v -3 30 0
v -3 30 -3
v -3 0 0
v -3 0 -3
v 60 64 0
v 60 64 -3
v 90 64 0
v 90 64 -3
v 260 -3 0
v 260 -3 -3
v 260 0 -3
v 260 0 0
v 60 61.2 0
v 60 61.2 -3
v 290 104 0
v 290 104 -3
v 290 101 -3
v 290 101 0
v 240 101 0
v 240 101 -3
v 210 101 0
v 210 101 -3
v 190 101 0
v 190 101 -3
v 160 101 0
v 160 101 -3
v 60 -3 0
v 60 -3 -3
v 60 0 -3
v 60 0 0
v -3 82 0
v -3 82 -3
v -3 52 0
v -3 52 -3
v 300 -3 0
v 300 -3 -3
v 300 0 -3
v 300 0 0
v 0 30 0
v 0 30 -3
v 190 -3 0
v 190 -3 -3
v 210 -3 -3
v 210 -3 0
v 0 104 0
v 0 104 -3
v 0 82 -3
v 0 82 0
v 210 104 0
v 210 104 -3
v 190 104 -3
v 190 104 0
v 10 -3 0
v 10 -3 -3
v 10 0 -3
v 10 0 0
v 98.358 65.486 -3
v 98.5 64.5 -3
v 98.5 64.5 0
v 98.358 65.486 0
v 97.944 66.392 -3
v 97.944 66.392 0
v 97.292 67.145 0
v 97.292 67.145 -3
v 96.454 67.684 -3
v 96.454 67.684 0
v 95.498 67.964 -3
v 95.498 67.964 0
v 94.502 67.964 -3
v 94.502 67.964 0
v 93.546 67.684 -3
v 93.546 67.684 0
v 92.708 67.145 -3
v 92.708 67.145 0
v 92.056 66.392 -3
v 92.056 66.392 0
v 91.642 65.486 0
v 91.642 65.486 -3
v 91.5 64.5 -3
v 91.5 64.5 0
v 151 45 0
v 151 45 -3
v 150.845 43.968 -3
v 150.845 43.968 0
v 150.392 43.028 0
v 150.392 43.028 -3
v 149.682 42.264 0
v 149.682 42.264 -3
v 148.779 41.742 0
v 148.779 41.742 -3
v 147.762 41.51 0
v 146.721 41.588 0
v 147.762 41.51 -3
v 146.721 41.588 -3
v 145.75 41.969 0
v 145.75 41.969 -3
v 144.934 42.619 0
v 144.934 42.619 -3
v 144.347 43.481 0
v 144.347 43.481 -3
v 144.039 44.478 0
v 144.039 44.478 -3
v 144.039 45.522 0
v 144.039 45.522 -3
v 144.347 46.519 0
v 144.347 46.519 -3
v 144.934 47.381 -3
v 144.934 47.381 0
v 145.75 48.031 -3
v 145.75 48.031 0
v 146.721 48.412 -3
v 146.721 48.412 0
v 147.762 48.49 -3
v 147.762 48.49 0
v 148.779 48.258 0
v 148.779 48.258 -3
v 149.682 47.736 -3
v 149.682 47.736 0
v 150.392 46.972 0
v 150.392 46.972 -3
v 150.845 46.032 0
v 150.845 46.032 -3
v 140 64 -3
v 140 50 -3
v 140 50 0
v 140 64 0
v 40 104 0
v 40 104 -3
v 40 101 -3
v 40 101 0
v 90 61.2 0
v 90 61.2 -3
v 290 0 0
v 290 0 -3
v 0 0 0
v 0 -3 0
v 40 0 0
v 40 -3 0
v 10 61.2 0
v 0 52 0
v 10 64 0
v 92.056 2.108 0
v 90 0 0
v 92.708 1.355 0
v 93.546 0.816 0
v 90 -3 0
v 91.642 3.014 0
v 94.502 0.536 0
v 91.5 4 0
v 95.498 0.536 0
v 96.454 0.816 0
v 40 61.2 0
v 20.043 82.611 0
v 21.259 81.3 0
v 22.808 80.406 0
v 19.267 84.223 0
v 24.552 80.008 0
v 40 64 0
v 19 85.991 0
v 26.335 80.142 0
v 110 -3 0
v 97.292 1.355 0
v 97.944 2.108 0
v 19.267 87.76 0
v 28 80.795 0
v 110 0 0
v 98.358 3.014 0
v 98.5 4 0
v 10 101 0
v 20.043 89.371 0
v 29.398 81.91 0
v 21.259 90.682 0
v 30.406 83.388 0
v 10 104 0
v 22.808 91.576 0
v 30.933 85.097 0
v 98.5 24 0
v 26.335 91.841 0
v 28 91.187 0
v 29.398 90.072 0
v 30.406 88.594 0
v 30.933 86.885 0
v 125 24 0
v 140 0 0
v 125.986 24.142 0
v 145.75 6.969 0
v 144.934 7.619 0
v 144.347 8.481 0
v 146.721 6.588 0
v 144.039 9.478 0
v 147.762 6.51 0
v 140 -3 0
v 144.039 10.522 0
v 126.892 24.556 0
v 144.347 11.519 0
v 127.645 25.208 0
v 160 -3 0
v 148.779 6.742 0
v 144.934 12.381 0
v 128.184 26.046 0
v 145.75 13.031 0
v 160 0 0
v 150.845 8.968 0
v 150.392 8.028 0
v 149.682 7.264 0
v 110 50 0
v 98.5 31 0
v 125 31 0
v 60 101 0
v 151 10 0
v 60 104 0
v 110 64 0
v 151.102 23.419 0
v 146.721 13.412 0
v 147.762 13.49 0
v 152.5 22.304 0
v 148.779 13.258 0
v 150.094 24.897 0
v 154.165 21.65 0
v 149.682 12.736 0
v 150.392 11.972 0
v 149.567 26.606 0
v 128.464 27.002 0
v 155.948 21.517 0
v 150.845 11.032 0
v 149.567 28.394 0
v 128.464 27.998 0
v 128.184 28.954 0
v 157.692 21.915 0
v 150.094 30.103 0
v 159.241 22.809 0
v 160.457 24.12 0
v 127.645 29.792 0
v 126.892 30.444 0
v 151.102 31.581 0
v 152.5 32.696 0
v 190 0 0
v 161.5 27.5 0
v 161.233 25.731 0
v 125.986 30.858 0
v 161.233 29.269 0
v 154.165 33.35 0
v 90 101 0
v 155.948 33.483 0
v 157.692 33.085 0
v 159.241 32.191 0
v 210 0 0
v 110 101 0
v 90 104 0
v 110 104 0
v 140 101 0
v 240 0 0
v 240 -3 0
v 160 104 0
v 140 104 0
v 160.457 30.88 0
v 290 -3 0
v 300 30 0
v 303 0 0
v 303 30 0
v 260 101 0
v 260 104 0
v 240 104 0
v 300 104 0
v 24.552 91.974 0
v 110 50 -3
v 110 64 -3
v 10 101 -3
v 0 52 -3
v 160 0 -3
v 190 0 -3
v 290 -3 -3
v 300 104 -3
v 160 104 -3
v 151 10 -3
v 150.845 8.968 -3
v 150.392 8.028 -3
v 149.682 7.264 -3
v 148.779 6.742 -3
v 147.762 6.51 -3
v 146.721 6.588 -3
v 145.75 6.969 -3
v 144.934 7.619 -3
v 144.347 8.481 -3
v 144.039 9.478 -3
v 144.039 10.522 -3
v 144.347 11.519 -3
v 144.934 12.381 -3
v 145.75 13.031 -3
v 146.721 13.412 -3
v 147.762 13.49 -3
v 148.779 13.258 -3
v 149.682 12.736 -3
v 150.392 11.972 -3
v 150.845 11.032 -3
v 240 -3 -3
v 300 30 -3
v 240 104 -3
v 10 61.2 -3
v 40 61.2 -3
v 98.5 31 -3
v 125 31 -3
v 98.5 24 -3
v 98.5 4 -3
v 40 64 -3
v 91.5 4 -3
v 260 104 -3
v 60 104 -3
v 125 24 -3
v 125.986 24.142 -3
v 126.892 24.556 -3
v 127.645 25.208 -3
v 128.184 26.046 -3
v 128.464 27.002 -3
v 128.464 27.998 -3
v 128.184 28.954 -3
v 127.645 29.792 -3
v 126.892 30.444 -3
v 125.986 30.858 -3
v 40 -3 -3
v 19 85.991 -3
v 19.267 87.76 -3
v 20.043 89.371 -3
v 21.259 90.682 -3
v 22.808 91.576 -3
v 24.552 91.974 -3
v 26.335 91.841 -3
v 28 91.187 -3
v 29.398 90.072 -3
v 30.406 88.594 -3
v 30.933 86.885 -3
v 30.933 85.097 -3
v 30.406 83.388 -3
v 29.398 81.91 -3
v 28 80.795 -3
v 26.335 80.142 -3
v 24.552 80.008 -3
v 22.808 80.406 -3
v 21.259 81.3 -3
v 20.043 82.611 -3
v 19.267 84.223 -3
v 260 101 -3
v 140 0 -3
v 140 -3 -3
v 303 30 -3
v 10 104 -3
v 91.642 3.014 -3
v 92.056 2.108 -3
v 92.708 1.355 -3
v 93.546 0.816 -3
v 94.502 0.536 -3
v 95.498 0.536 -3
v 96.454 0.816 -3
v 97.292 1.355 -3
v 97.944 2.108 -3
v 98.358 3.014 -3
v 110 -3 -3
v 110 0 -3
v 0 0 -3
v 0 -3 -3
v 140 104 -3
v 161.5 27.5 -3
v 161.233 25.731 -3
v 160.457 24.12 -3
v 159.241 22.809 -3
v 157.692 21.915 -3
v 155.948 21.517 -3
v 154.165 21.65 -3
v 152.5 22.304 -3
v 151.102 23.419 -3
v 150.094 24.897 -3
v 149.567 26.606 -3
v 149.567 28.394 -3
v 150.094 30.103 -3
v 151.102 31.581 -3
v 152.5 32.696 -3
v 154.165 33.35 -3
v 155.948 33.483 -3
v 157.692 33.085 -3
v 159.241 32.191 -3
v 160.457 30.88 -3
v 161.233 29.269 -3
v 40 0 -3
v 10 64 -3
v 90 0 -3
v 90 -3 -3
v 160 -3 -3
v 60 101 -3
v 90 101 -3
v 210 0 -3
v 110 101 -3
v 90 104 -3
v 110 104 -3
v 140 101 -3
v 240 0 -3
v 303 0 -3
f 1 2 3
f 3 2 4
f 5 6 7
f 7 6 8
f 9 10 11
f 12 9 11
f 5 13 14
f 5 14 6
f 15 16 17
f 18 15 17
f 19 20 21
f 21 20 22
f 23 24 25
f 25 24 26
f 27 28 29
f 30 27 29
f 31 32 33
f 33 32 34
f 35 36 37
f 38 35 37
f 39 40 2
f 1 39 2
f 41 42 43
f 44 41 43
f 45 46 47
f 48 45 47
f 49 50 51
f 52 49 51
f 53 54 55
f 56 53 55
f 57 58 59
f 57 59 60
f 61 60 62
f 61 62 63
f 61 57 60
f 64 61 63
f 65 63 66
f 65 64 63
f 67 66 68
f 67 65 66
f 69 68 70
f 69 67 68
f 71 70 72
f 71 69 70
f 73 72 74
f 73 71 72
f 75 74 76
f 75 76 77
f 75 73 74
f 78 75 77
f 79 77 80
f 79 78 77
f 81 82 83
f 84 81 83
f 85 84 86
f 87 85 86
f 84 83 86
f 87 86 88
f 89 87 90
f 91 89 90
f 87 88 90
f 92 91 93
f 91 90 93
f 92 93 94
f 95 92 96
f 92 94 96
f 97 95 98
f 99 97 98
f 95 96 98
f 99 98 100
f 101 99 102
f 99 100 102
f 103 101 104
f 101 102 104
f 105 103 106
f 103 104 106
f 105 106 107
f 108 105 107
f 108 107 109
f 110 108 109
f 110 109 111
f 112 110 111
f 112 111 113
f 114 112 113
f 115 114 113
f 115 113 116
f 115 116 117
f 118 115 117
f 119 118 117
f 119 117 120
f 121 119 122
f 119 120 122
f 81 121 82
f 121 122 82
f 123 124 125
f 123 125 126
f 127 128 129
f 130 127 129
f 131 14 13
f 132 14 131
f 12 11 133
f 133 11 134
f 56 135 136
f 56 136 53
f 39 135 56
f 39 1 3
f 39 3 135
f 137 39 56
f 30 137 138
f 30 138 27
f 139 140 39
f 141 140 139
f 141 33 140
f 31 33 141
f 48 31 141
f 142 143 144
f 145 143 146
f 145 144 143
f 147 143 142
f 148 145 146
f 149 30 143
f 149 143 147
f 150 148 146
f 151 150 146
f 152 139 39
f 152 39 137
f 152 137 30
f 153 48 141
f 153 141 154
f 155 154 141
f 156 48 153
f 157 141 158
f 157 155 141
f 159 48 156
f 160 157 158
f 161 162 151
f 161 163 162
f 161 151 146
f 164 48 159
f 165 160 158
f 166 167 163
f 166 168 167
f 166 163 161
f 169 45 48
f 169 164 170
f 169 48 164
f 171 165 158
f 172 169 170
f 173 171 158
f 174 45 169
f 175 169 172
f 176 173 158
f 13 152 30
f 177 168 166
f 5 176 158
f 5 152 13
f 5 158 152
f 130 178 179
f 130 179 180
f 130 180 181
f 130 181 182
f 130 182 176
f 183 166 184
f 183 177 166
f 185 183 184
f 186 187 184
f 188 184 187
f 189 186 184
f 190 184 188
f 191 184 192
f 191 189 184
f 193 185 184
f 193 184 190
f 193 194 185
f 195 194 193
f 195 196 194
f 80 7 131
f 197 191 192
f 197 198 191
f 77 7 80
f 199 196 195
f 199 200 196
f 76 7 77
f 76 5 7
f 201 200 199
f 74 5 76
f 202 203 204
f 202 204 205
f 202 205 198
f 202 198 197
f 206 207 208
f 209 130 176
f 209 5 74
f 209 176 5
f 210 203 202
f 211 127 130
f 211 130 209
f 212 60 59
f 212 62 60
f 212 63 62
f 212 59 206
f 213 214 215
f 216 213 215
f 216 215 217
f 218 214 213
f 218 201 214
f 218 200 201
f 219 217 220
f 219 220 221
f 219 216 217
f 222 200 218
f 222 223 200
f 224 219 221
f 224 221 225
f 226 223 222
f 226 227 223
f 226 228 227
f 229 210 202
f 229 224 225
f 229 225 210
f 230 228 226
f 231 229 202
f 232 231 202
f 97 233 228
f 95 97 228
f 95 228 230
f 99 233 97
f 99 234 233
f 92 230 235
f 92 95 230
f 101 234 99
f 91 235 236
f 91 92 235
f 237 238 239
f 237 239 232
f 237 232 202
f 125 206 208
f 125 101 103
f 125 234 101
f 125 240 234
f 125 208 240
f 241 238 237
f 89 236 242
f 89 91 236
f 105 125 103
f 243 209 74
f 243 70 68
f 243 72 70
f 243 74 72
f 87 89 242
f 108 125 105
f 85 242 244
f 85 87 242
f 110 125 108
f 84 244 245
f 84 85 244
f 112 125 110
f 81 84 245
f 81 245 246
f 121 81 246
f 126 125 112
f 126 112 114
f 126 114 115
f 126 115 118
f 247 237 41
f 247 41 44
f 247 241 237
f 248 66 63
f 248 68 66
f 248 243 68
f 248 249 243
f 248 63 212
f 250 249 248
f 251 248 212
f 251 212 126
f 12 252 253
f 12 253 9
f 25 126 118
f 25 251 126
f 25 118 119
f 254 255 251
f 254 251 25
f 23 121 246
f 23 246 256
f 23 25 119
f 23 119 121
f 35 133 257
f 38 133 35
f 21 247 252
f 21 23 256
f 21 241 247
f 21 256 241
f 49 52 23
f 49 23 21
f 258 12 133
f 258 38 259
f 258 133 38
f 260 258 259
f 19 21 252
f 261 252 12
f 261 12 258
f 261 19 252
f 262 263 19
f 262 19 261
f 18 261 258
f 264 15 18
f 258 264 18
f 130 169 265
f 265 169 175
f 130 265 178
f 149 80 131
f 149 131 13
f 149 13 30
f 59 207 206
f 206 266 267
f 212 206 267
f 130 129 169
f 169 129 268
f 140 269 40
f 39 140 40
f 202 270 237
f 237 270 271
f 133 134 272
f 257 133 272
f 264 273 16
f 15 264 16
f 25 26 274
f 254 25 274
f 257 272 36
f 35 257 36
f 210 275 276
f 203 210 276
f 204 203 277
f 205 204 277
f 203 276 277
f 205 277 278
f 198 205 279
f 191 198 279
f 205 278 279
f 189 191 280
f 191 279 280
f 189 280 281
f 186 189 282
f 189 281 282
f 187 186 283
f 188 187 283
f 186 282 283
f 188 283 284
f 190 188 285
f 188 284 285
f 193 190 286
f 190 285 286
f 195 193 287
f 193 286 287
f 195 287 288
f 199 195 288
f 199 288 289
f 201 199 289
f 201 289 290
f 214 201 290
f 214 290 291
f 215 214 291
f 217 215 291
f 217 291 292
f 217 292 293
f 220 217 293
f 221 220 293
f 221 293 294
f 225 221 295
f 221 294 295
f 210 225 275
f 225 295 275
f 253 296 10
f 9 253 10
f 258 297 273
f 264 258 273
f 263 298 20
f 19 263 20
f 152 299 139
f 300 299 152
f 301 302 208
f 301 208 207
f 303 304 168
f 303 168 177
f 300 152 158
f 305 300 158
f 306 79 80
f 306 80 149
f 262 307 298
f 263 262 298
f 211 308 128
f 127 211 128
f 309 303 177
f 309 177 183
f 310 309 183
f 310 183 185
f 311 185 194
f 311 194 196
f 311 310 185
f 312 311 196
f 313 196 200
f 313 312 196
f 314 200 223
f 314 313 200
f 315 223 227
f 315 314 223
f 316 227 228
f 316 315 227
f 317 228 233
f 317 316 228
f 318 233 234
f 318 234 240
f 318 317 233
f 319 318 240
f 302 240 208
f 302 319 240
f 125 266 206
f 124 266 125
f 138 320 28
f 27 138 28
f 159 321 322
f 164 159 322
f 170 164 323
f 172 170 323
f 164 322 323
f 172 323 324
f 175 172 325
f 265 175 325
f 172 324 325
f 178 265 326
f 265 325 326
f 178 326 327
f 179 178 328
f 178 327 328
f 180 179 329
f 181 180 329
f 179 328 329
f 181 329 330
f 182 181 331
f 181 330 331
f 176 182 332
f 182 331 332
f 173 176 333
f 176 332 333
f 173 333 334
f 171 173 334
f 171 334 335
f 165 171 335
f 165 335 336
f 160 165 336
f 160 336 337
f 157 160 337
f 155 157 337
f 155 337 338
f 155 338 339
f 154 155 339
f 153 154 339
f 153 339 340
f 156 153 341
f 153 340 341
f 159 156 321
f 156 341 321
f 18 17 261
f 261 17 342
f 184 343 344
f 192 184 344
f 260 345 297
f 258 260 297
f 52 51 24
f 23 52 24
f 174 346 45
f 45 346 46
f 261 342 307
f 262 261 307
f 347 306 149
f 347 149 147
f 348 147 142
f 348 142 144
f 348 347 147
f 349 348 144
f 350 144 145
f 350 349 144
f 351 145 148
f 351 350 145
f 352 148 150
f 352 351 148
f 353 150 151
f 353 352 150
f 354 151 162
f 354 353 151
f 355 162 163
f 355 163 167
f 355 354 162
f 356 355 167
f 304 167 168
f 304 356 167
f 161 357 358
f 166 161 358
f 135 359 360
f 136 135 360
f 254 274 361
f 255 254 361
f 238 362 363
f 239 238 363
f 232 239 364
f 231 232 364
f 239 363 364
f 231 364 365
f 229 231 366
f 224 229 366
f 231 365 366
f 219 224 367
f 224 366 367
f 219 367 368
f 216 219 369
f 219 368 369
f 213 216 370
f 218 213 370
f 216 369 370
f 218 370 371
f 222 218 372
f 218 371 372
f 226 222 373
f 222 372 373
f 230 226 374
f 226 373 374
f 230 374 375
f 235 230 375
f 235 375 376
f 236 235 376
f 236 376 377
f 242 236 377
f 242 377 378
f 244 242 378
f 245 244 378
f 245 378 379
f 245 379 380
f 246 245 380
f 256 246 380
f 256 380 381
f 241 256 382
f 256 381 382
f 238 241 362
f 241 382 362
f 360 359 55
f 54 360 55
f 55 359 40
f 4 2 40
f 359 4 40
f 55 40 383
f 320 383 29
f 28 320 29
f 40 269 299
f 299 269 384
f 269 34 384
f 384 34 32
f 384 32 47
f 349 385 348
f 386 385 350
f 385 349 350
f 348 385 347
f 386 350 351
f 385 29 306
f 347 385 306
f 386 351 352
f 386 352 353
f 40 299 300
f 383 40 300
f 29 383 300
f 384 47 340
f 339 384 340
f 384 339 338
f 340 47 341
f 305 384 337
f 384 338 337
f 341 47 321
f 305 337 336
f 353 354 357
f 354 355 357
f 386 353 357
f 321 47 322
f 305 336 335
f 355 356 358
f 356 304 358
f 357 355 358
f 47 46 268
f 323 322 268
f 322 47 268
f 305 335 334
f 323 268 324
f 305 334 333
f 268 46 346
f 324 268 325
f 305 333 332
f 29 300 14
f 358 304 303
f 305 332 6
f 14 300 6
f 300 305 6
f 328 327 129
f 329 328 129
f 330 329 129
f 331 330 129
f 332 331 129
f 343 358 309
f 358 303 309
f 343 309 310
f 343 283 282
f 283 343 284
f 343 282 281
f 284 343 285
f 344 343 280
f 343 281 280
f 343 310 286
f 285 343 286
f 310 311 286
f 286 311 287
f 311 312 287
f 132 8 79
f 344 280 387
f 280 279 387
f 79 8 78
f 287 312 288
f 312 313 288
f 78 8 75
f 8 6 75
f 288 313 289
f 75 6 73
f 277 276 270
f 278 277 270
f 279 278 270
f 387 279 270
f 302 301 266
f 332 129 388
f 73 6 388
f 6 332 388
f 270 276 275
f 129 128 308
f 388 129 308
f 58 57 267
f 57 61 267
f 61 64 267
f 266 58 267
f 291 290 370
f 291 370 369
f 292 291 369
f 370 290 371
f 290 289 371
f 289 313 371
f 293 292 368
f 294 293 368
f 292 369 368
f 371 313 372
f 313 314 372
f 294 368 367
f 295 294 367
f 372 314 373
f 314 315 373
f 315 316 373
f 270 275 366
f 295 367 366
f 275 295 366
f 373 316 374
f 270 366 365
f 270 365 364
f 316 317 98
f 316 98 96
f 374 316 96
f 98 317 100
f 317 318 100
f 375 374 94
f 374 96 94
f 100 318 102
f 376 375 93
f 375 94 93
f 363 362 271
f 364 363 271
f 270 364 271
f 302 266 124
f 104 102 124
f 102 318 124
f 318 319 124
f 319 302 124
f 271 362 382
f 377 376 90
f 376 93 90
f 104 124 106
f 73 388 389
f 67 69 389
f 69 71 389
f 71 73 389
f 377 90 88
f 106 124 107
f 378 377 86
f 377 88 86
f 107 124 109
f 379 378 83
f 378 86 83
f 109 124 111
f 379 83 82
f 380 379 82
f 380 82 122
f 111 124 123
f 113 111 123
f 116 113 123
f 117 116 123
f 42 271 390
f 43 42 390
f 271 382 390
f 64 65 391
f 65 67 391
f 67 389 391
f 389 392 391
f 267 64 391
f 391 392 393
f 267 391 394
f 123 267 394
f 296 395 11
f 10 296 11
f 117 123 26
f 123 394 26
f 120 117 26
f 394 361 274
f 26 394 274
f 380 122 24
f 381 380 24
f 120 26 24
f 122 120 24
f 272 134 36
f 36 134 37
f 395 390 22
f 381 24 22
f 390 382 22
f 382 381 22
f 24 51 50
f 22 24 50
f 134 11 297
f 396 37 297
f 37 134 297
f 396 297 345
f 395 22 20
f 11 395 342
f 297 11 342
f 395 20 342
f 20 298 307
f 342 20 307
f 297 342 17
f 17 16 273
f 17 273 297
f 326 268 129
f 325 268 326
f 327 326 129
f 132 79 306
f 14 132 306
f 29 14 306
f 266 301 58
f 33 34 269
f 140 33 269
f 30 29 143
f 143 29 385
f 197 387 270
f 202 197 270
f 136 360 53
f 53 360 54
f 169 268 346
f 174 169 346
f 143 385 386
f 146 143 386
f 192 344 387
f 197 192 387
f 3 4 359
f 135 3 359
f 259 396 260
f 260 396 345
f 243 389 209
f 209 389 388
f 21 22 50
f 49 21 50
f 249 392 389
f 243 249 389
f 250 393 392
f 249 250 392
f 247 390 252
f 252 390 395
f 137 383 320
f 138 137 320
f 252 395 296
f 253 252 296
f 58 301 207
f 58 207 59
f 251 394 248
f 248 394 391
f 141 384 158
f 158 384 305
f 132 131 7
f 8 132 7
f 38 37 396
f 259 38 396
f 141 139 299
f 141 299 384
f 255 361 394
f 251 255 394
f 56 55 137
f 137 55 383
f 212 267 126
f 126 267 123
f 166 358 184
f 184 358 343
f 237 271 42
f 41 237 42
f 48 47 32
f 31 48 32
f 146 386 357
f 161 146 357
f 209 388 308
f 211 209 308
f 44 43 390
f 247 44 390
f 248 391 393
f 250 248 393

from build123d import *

# Parameters (mm, degrees)
IMPORTED_START                = -3
IMPORTED_BODY_4_1_OUTLINE_W   = 30
IMPORTED_BODY_4_1_OUTLINE_H   = 2.8
IMPORTED_BODY_4_1_OUTLINE_H_2 = 14
IMPORTED_BODY_4_1_DEPTH       = 3
SKETCH_1_R                    = 3.5
SKETCH_1_R_2                  = 6
CUT_EXTRUDE_1_DEPTH           = 3


# Read off the part's stored shape, not the designer's step: 基体零件-零件4-1
with BuildPart() as part:
    # 基体零件-零件4-1 outline → 基体零件-零件4-1 (new body)
    with BuildSketch(Plane.XY.offset(IMPORTED_START)):
        Polygon((0, 0), (0, -3), (10, -3), (10, 0), (40, 0), (40, -3), (60, -3), (60, 0), (90, 0), (90, -3), (110, -3), (110, 0), (140, 0), (140, -3), (160, -3), (160, 0), (190, 0), (190, -3), (210, -3), (210, 0), (240, 0), (240, -3), (260, -3), (260, 0), (290, 0), (290, -3), (300.000000004, -3), (300.000000004, 0), (303.000000004, 0), (303.000000004, 30), (300.000000004, 30), (300.000000004, 104), (290, 104), (290, 100.999999998), (260, 100.999999998), (260, 103.999999998), (240, 103.999999998), (240, 100.999999998), (210, 100.999999998), (210, 103.999999998), (190, 103.999999998), (190, 100.999999998), (160, 100.999999998), (160, 103.999999998), (140, 103.999999998), (140, 100.999999998), (110, 100.999999998), (110, 103.999999998), (90, 103.999999998), (90, 100.999999998), (60, 100.999999998), (60, 103.999999998), (40, 103.999999998), (40, 100.999999998), (10, 100.999999998), (10, 103.999999998), (0, 103.999999998), (0, 81.999999998), (-3, 81.999999998), (-3, 51.999999998), (0, 51.999999998), (0, 30), (-3, 30), (-3, 0), align=None)
        with Locations((25, 62.6)):
            Rectangle(IMPORTED_BODY_4_1_OUTLINE_W, IMPORTED_BODY_4_1_OUTLINE_H, mode=Mode.SUBTRACT)
        with Locations((75, 62.6)):
            Rectangle(IMPORTED_BODY_4_1_OUTLINE_W, IMPORTED_BODY_4_1_OUTLINE_H, mode=Mode.SUBTRACT)
        with Locations((125, 57)):
            Rectangle(IMPORTED_BODY_4_1_OUTLINE_W, IMPORTED_BODY_4_1_OUTLINE_H_2, mode=Mode.SUBTRACT)
    extrude(amount=IMPORTED_BODY_4_1_DEPTH)

    # 草图1 → 切除-拉伸1 (cut)
    with BuildSketch(Plane(origin=(0, 0, -3), x_dir=(-1, 0, 0), z_dir=(0, 0, -1))):
        with Locations(Location((-147.5, 10, 0), (0, 0, 180))):
            Circle(SKETCH_1_R)
        with Locations(Location((-147.5, 45, 0), (0, 0, 180))):
            Circle(SKETCH_1_R)
        with Locations(Location((-155.5, 27.5, 0), (0, 0, 180))):
            Circle(SKETCH_1_R_2)
        with Locations((-25, 85.991178075)):
            Circle(SKETCH_1_R_2)
        with BuildLine():
            Line((-125, 31), (-98.5, 31))
            Line((-98.5, 31), (-98.5, 64.5))
            ThreePointArc((-98.5, 64.5), (-95, 68), (-91.5, 64.5))
            Line((-91.5, 64.5), (-91.5, 4))
            ThreePointArc((-91.5, 4), (-95, 0.5), (-98.5, 4))
            Line((-98.5, 4), (-98.5, 24))
            Line((-98.5, 24), (-125, 24))
            ThreePointArc((-125, 24), (-128.5, 27.5), (-125, 31))
        make_face()
    extrude(amount=-CUT_EXTRUDE_1_DEPTH, mode=Mode.SUBTRACT)


solid = part.part
